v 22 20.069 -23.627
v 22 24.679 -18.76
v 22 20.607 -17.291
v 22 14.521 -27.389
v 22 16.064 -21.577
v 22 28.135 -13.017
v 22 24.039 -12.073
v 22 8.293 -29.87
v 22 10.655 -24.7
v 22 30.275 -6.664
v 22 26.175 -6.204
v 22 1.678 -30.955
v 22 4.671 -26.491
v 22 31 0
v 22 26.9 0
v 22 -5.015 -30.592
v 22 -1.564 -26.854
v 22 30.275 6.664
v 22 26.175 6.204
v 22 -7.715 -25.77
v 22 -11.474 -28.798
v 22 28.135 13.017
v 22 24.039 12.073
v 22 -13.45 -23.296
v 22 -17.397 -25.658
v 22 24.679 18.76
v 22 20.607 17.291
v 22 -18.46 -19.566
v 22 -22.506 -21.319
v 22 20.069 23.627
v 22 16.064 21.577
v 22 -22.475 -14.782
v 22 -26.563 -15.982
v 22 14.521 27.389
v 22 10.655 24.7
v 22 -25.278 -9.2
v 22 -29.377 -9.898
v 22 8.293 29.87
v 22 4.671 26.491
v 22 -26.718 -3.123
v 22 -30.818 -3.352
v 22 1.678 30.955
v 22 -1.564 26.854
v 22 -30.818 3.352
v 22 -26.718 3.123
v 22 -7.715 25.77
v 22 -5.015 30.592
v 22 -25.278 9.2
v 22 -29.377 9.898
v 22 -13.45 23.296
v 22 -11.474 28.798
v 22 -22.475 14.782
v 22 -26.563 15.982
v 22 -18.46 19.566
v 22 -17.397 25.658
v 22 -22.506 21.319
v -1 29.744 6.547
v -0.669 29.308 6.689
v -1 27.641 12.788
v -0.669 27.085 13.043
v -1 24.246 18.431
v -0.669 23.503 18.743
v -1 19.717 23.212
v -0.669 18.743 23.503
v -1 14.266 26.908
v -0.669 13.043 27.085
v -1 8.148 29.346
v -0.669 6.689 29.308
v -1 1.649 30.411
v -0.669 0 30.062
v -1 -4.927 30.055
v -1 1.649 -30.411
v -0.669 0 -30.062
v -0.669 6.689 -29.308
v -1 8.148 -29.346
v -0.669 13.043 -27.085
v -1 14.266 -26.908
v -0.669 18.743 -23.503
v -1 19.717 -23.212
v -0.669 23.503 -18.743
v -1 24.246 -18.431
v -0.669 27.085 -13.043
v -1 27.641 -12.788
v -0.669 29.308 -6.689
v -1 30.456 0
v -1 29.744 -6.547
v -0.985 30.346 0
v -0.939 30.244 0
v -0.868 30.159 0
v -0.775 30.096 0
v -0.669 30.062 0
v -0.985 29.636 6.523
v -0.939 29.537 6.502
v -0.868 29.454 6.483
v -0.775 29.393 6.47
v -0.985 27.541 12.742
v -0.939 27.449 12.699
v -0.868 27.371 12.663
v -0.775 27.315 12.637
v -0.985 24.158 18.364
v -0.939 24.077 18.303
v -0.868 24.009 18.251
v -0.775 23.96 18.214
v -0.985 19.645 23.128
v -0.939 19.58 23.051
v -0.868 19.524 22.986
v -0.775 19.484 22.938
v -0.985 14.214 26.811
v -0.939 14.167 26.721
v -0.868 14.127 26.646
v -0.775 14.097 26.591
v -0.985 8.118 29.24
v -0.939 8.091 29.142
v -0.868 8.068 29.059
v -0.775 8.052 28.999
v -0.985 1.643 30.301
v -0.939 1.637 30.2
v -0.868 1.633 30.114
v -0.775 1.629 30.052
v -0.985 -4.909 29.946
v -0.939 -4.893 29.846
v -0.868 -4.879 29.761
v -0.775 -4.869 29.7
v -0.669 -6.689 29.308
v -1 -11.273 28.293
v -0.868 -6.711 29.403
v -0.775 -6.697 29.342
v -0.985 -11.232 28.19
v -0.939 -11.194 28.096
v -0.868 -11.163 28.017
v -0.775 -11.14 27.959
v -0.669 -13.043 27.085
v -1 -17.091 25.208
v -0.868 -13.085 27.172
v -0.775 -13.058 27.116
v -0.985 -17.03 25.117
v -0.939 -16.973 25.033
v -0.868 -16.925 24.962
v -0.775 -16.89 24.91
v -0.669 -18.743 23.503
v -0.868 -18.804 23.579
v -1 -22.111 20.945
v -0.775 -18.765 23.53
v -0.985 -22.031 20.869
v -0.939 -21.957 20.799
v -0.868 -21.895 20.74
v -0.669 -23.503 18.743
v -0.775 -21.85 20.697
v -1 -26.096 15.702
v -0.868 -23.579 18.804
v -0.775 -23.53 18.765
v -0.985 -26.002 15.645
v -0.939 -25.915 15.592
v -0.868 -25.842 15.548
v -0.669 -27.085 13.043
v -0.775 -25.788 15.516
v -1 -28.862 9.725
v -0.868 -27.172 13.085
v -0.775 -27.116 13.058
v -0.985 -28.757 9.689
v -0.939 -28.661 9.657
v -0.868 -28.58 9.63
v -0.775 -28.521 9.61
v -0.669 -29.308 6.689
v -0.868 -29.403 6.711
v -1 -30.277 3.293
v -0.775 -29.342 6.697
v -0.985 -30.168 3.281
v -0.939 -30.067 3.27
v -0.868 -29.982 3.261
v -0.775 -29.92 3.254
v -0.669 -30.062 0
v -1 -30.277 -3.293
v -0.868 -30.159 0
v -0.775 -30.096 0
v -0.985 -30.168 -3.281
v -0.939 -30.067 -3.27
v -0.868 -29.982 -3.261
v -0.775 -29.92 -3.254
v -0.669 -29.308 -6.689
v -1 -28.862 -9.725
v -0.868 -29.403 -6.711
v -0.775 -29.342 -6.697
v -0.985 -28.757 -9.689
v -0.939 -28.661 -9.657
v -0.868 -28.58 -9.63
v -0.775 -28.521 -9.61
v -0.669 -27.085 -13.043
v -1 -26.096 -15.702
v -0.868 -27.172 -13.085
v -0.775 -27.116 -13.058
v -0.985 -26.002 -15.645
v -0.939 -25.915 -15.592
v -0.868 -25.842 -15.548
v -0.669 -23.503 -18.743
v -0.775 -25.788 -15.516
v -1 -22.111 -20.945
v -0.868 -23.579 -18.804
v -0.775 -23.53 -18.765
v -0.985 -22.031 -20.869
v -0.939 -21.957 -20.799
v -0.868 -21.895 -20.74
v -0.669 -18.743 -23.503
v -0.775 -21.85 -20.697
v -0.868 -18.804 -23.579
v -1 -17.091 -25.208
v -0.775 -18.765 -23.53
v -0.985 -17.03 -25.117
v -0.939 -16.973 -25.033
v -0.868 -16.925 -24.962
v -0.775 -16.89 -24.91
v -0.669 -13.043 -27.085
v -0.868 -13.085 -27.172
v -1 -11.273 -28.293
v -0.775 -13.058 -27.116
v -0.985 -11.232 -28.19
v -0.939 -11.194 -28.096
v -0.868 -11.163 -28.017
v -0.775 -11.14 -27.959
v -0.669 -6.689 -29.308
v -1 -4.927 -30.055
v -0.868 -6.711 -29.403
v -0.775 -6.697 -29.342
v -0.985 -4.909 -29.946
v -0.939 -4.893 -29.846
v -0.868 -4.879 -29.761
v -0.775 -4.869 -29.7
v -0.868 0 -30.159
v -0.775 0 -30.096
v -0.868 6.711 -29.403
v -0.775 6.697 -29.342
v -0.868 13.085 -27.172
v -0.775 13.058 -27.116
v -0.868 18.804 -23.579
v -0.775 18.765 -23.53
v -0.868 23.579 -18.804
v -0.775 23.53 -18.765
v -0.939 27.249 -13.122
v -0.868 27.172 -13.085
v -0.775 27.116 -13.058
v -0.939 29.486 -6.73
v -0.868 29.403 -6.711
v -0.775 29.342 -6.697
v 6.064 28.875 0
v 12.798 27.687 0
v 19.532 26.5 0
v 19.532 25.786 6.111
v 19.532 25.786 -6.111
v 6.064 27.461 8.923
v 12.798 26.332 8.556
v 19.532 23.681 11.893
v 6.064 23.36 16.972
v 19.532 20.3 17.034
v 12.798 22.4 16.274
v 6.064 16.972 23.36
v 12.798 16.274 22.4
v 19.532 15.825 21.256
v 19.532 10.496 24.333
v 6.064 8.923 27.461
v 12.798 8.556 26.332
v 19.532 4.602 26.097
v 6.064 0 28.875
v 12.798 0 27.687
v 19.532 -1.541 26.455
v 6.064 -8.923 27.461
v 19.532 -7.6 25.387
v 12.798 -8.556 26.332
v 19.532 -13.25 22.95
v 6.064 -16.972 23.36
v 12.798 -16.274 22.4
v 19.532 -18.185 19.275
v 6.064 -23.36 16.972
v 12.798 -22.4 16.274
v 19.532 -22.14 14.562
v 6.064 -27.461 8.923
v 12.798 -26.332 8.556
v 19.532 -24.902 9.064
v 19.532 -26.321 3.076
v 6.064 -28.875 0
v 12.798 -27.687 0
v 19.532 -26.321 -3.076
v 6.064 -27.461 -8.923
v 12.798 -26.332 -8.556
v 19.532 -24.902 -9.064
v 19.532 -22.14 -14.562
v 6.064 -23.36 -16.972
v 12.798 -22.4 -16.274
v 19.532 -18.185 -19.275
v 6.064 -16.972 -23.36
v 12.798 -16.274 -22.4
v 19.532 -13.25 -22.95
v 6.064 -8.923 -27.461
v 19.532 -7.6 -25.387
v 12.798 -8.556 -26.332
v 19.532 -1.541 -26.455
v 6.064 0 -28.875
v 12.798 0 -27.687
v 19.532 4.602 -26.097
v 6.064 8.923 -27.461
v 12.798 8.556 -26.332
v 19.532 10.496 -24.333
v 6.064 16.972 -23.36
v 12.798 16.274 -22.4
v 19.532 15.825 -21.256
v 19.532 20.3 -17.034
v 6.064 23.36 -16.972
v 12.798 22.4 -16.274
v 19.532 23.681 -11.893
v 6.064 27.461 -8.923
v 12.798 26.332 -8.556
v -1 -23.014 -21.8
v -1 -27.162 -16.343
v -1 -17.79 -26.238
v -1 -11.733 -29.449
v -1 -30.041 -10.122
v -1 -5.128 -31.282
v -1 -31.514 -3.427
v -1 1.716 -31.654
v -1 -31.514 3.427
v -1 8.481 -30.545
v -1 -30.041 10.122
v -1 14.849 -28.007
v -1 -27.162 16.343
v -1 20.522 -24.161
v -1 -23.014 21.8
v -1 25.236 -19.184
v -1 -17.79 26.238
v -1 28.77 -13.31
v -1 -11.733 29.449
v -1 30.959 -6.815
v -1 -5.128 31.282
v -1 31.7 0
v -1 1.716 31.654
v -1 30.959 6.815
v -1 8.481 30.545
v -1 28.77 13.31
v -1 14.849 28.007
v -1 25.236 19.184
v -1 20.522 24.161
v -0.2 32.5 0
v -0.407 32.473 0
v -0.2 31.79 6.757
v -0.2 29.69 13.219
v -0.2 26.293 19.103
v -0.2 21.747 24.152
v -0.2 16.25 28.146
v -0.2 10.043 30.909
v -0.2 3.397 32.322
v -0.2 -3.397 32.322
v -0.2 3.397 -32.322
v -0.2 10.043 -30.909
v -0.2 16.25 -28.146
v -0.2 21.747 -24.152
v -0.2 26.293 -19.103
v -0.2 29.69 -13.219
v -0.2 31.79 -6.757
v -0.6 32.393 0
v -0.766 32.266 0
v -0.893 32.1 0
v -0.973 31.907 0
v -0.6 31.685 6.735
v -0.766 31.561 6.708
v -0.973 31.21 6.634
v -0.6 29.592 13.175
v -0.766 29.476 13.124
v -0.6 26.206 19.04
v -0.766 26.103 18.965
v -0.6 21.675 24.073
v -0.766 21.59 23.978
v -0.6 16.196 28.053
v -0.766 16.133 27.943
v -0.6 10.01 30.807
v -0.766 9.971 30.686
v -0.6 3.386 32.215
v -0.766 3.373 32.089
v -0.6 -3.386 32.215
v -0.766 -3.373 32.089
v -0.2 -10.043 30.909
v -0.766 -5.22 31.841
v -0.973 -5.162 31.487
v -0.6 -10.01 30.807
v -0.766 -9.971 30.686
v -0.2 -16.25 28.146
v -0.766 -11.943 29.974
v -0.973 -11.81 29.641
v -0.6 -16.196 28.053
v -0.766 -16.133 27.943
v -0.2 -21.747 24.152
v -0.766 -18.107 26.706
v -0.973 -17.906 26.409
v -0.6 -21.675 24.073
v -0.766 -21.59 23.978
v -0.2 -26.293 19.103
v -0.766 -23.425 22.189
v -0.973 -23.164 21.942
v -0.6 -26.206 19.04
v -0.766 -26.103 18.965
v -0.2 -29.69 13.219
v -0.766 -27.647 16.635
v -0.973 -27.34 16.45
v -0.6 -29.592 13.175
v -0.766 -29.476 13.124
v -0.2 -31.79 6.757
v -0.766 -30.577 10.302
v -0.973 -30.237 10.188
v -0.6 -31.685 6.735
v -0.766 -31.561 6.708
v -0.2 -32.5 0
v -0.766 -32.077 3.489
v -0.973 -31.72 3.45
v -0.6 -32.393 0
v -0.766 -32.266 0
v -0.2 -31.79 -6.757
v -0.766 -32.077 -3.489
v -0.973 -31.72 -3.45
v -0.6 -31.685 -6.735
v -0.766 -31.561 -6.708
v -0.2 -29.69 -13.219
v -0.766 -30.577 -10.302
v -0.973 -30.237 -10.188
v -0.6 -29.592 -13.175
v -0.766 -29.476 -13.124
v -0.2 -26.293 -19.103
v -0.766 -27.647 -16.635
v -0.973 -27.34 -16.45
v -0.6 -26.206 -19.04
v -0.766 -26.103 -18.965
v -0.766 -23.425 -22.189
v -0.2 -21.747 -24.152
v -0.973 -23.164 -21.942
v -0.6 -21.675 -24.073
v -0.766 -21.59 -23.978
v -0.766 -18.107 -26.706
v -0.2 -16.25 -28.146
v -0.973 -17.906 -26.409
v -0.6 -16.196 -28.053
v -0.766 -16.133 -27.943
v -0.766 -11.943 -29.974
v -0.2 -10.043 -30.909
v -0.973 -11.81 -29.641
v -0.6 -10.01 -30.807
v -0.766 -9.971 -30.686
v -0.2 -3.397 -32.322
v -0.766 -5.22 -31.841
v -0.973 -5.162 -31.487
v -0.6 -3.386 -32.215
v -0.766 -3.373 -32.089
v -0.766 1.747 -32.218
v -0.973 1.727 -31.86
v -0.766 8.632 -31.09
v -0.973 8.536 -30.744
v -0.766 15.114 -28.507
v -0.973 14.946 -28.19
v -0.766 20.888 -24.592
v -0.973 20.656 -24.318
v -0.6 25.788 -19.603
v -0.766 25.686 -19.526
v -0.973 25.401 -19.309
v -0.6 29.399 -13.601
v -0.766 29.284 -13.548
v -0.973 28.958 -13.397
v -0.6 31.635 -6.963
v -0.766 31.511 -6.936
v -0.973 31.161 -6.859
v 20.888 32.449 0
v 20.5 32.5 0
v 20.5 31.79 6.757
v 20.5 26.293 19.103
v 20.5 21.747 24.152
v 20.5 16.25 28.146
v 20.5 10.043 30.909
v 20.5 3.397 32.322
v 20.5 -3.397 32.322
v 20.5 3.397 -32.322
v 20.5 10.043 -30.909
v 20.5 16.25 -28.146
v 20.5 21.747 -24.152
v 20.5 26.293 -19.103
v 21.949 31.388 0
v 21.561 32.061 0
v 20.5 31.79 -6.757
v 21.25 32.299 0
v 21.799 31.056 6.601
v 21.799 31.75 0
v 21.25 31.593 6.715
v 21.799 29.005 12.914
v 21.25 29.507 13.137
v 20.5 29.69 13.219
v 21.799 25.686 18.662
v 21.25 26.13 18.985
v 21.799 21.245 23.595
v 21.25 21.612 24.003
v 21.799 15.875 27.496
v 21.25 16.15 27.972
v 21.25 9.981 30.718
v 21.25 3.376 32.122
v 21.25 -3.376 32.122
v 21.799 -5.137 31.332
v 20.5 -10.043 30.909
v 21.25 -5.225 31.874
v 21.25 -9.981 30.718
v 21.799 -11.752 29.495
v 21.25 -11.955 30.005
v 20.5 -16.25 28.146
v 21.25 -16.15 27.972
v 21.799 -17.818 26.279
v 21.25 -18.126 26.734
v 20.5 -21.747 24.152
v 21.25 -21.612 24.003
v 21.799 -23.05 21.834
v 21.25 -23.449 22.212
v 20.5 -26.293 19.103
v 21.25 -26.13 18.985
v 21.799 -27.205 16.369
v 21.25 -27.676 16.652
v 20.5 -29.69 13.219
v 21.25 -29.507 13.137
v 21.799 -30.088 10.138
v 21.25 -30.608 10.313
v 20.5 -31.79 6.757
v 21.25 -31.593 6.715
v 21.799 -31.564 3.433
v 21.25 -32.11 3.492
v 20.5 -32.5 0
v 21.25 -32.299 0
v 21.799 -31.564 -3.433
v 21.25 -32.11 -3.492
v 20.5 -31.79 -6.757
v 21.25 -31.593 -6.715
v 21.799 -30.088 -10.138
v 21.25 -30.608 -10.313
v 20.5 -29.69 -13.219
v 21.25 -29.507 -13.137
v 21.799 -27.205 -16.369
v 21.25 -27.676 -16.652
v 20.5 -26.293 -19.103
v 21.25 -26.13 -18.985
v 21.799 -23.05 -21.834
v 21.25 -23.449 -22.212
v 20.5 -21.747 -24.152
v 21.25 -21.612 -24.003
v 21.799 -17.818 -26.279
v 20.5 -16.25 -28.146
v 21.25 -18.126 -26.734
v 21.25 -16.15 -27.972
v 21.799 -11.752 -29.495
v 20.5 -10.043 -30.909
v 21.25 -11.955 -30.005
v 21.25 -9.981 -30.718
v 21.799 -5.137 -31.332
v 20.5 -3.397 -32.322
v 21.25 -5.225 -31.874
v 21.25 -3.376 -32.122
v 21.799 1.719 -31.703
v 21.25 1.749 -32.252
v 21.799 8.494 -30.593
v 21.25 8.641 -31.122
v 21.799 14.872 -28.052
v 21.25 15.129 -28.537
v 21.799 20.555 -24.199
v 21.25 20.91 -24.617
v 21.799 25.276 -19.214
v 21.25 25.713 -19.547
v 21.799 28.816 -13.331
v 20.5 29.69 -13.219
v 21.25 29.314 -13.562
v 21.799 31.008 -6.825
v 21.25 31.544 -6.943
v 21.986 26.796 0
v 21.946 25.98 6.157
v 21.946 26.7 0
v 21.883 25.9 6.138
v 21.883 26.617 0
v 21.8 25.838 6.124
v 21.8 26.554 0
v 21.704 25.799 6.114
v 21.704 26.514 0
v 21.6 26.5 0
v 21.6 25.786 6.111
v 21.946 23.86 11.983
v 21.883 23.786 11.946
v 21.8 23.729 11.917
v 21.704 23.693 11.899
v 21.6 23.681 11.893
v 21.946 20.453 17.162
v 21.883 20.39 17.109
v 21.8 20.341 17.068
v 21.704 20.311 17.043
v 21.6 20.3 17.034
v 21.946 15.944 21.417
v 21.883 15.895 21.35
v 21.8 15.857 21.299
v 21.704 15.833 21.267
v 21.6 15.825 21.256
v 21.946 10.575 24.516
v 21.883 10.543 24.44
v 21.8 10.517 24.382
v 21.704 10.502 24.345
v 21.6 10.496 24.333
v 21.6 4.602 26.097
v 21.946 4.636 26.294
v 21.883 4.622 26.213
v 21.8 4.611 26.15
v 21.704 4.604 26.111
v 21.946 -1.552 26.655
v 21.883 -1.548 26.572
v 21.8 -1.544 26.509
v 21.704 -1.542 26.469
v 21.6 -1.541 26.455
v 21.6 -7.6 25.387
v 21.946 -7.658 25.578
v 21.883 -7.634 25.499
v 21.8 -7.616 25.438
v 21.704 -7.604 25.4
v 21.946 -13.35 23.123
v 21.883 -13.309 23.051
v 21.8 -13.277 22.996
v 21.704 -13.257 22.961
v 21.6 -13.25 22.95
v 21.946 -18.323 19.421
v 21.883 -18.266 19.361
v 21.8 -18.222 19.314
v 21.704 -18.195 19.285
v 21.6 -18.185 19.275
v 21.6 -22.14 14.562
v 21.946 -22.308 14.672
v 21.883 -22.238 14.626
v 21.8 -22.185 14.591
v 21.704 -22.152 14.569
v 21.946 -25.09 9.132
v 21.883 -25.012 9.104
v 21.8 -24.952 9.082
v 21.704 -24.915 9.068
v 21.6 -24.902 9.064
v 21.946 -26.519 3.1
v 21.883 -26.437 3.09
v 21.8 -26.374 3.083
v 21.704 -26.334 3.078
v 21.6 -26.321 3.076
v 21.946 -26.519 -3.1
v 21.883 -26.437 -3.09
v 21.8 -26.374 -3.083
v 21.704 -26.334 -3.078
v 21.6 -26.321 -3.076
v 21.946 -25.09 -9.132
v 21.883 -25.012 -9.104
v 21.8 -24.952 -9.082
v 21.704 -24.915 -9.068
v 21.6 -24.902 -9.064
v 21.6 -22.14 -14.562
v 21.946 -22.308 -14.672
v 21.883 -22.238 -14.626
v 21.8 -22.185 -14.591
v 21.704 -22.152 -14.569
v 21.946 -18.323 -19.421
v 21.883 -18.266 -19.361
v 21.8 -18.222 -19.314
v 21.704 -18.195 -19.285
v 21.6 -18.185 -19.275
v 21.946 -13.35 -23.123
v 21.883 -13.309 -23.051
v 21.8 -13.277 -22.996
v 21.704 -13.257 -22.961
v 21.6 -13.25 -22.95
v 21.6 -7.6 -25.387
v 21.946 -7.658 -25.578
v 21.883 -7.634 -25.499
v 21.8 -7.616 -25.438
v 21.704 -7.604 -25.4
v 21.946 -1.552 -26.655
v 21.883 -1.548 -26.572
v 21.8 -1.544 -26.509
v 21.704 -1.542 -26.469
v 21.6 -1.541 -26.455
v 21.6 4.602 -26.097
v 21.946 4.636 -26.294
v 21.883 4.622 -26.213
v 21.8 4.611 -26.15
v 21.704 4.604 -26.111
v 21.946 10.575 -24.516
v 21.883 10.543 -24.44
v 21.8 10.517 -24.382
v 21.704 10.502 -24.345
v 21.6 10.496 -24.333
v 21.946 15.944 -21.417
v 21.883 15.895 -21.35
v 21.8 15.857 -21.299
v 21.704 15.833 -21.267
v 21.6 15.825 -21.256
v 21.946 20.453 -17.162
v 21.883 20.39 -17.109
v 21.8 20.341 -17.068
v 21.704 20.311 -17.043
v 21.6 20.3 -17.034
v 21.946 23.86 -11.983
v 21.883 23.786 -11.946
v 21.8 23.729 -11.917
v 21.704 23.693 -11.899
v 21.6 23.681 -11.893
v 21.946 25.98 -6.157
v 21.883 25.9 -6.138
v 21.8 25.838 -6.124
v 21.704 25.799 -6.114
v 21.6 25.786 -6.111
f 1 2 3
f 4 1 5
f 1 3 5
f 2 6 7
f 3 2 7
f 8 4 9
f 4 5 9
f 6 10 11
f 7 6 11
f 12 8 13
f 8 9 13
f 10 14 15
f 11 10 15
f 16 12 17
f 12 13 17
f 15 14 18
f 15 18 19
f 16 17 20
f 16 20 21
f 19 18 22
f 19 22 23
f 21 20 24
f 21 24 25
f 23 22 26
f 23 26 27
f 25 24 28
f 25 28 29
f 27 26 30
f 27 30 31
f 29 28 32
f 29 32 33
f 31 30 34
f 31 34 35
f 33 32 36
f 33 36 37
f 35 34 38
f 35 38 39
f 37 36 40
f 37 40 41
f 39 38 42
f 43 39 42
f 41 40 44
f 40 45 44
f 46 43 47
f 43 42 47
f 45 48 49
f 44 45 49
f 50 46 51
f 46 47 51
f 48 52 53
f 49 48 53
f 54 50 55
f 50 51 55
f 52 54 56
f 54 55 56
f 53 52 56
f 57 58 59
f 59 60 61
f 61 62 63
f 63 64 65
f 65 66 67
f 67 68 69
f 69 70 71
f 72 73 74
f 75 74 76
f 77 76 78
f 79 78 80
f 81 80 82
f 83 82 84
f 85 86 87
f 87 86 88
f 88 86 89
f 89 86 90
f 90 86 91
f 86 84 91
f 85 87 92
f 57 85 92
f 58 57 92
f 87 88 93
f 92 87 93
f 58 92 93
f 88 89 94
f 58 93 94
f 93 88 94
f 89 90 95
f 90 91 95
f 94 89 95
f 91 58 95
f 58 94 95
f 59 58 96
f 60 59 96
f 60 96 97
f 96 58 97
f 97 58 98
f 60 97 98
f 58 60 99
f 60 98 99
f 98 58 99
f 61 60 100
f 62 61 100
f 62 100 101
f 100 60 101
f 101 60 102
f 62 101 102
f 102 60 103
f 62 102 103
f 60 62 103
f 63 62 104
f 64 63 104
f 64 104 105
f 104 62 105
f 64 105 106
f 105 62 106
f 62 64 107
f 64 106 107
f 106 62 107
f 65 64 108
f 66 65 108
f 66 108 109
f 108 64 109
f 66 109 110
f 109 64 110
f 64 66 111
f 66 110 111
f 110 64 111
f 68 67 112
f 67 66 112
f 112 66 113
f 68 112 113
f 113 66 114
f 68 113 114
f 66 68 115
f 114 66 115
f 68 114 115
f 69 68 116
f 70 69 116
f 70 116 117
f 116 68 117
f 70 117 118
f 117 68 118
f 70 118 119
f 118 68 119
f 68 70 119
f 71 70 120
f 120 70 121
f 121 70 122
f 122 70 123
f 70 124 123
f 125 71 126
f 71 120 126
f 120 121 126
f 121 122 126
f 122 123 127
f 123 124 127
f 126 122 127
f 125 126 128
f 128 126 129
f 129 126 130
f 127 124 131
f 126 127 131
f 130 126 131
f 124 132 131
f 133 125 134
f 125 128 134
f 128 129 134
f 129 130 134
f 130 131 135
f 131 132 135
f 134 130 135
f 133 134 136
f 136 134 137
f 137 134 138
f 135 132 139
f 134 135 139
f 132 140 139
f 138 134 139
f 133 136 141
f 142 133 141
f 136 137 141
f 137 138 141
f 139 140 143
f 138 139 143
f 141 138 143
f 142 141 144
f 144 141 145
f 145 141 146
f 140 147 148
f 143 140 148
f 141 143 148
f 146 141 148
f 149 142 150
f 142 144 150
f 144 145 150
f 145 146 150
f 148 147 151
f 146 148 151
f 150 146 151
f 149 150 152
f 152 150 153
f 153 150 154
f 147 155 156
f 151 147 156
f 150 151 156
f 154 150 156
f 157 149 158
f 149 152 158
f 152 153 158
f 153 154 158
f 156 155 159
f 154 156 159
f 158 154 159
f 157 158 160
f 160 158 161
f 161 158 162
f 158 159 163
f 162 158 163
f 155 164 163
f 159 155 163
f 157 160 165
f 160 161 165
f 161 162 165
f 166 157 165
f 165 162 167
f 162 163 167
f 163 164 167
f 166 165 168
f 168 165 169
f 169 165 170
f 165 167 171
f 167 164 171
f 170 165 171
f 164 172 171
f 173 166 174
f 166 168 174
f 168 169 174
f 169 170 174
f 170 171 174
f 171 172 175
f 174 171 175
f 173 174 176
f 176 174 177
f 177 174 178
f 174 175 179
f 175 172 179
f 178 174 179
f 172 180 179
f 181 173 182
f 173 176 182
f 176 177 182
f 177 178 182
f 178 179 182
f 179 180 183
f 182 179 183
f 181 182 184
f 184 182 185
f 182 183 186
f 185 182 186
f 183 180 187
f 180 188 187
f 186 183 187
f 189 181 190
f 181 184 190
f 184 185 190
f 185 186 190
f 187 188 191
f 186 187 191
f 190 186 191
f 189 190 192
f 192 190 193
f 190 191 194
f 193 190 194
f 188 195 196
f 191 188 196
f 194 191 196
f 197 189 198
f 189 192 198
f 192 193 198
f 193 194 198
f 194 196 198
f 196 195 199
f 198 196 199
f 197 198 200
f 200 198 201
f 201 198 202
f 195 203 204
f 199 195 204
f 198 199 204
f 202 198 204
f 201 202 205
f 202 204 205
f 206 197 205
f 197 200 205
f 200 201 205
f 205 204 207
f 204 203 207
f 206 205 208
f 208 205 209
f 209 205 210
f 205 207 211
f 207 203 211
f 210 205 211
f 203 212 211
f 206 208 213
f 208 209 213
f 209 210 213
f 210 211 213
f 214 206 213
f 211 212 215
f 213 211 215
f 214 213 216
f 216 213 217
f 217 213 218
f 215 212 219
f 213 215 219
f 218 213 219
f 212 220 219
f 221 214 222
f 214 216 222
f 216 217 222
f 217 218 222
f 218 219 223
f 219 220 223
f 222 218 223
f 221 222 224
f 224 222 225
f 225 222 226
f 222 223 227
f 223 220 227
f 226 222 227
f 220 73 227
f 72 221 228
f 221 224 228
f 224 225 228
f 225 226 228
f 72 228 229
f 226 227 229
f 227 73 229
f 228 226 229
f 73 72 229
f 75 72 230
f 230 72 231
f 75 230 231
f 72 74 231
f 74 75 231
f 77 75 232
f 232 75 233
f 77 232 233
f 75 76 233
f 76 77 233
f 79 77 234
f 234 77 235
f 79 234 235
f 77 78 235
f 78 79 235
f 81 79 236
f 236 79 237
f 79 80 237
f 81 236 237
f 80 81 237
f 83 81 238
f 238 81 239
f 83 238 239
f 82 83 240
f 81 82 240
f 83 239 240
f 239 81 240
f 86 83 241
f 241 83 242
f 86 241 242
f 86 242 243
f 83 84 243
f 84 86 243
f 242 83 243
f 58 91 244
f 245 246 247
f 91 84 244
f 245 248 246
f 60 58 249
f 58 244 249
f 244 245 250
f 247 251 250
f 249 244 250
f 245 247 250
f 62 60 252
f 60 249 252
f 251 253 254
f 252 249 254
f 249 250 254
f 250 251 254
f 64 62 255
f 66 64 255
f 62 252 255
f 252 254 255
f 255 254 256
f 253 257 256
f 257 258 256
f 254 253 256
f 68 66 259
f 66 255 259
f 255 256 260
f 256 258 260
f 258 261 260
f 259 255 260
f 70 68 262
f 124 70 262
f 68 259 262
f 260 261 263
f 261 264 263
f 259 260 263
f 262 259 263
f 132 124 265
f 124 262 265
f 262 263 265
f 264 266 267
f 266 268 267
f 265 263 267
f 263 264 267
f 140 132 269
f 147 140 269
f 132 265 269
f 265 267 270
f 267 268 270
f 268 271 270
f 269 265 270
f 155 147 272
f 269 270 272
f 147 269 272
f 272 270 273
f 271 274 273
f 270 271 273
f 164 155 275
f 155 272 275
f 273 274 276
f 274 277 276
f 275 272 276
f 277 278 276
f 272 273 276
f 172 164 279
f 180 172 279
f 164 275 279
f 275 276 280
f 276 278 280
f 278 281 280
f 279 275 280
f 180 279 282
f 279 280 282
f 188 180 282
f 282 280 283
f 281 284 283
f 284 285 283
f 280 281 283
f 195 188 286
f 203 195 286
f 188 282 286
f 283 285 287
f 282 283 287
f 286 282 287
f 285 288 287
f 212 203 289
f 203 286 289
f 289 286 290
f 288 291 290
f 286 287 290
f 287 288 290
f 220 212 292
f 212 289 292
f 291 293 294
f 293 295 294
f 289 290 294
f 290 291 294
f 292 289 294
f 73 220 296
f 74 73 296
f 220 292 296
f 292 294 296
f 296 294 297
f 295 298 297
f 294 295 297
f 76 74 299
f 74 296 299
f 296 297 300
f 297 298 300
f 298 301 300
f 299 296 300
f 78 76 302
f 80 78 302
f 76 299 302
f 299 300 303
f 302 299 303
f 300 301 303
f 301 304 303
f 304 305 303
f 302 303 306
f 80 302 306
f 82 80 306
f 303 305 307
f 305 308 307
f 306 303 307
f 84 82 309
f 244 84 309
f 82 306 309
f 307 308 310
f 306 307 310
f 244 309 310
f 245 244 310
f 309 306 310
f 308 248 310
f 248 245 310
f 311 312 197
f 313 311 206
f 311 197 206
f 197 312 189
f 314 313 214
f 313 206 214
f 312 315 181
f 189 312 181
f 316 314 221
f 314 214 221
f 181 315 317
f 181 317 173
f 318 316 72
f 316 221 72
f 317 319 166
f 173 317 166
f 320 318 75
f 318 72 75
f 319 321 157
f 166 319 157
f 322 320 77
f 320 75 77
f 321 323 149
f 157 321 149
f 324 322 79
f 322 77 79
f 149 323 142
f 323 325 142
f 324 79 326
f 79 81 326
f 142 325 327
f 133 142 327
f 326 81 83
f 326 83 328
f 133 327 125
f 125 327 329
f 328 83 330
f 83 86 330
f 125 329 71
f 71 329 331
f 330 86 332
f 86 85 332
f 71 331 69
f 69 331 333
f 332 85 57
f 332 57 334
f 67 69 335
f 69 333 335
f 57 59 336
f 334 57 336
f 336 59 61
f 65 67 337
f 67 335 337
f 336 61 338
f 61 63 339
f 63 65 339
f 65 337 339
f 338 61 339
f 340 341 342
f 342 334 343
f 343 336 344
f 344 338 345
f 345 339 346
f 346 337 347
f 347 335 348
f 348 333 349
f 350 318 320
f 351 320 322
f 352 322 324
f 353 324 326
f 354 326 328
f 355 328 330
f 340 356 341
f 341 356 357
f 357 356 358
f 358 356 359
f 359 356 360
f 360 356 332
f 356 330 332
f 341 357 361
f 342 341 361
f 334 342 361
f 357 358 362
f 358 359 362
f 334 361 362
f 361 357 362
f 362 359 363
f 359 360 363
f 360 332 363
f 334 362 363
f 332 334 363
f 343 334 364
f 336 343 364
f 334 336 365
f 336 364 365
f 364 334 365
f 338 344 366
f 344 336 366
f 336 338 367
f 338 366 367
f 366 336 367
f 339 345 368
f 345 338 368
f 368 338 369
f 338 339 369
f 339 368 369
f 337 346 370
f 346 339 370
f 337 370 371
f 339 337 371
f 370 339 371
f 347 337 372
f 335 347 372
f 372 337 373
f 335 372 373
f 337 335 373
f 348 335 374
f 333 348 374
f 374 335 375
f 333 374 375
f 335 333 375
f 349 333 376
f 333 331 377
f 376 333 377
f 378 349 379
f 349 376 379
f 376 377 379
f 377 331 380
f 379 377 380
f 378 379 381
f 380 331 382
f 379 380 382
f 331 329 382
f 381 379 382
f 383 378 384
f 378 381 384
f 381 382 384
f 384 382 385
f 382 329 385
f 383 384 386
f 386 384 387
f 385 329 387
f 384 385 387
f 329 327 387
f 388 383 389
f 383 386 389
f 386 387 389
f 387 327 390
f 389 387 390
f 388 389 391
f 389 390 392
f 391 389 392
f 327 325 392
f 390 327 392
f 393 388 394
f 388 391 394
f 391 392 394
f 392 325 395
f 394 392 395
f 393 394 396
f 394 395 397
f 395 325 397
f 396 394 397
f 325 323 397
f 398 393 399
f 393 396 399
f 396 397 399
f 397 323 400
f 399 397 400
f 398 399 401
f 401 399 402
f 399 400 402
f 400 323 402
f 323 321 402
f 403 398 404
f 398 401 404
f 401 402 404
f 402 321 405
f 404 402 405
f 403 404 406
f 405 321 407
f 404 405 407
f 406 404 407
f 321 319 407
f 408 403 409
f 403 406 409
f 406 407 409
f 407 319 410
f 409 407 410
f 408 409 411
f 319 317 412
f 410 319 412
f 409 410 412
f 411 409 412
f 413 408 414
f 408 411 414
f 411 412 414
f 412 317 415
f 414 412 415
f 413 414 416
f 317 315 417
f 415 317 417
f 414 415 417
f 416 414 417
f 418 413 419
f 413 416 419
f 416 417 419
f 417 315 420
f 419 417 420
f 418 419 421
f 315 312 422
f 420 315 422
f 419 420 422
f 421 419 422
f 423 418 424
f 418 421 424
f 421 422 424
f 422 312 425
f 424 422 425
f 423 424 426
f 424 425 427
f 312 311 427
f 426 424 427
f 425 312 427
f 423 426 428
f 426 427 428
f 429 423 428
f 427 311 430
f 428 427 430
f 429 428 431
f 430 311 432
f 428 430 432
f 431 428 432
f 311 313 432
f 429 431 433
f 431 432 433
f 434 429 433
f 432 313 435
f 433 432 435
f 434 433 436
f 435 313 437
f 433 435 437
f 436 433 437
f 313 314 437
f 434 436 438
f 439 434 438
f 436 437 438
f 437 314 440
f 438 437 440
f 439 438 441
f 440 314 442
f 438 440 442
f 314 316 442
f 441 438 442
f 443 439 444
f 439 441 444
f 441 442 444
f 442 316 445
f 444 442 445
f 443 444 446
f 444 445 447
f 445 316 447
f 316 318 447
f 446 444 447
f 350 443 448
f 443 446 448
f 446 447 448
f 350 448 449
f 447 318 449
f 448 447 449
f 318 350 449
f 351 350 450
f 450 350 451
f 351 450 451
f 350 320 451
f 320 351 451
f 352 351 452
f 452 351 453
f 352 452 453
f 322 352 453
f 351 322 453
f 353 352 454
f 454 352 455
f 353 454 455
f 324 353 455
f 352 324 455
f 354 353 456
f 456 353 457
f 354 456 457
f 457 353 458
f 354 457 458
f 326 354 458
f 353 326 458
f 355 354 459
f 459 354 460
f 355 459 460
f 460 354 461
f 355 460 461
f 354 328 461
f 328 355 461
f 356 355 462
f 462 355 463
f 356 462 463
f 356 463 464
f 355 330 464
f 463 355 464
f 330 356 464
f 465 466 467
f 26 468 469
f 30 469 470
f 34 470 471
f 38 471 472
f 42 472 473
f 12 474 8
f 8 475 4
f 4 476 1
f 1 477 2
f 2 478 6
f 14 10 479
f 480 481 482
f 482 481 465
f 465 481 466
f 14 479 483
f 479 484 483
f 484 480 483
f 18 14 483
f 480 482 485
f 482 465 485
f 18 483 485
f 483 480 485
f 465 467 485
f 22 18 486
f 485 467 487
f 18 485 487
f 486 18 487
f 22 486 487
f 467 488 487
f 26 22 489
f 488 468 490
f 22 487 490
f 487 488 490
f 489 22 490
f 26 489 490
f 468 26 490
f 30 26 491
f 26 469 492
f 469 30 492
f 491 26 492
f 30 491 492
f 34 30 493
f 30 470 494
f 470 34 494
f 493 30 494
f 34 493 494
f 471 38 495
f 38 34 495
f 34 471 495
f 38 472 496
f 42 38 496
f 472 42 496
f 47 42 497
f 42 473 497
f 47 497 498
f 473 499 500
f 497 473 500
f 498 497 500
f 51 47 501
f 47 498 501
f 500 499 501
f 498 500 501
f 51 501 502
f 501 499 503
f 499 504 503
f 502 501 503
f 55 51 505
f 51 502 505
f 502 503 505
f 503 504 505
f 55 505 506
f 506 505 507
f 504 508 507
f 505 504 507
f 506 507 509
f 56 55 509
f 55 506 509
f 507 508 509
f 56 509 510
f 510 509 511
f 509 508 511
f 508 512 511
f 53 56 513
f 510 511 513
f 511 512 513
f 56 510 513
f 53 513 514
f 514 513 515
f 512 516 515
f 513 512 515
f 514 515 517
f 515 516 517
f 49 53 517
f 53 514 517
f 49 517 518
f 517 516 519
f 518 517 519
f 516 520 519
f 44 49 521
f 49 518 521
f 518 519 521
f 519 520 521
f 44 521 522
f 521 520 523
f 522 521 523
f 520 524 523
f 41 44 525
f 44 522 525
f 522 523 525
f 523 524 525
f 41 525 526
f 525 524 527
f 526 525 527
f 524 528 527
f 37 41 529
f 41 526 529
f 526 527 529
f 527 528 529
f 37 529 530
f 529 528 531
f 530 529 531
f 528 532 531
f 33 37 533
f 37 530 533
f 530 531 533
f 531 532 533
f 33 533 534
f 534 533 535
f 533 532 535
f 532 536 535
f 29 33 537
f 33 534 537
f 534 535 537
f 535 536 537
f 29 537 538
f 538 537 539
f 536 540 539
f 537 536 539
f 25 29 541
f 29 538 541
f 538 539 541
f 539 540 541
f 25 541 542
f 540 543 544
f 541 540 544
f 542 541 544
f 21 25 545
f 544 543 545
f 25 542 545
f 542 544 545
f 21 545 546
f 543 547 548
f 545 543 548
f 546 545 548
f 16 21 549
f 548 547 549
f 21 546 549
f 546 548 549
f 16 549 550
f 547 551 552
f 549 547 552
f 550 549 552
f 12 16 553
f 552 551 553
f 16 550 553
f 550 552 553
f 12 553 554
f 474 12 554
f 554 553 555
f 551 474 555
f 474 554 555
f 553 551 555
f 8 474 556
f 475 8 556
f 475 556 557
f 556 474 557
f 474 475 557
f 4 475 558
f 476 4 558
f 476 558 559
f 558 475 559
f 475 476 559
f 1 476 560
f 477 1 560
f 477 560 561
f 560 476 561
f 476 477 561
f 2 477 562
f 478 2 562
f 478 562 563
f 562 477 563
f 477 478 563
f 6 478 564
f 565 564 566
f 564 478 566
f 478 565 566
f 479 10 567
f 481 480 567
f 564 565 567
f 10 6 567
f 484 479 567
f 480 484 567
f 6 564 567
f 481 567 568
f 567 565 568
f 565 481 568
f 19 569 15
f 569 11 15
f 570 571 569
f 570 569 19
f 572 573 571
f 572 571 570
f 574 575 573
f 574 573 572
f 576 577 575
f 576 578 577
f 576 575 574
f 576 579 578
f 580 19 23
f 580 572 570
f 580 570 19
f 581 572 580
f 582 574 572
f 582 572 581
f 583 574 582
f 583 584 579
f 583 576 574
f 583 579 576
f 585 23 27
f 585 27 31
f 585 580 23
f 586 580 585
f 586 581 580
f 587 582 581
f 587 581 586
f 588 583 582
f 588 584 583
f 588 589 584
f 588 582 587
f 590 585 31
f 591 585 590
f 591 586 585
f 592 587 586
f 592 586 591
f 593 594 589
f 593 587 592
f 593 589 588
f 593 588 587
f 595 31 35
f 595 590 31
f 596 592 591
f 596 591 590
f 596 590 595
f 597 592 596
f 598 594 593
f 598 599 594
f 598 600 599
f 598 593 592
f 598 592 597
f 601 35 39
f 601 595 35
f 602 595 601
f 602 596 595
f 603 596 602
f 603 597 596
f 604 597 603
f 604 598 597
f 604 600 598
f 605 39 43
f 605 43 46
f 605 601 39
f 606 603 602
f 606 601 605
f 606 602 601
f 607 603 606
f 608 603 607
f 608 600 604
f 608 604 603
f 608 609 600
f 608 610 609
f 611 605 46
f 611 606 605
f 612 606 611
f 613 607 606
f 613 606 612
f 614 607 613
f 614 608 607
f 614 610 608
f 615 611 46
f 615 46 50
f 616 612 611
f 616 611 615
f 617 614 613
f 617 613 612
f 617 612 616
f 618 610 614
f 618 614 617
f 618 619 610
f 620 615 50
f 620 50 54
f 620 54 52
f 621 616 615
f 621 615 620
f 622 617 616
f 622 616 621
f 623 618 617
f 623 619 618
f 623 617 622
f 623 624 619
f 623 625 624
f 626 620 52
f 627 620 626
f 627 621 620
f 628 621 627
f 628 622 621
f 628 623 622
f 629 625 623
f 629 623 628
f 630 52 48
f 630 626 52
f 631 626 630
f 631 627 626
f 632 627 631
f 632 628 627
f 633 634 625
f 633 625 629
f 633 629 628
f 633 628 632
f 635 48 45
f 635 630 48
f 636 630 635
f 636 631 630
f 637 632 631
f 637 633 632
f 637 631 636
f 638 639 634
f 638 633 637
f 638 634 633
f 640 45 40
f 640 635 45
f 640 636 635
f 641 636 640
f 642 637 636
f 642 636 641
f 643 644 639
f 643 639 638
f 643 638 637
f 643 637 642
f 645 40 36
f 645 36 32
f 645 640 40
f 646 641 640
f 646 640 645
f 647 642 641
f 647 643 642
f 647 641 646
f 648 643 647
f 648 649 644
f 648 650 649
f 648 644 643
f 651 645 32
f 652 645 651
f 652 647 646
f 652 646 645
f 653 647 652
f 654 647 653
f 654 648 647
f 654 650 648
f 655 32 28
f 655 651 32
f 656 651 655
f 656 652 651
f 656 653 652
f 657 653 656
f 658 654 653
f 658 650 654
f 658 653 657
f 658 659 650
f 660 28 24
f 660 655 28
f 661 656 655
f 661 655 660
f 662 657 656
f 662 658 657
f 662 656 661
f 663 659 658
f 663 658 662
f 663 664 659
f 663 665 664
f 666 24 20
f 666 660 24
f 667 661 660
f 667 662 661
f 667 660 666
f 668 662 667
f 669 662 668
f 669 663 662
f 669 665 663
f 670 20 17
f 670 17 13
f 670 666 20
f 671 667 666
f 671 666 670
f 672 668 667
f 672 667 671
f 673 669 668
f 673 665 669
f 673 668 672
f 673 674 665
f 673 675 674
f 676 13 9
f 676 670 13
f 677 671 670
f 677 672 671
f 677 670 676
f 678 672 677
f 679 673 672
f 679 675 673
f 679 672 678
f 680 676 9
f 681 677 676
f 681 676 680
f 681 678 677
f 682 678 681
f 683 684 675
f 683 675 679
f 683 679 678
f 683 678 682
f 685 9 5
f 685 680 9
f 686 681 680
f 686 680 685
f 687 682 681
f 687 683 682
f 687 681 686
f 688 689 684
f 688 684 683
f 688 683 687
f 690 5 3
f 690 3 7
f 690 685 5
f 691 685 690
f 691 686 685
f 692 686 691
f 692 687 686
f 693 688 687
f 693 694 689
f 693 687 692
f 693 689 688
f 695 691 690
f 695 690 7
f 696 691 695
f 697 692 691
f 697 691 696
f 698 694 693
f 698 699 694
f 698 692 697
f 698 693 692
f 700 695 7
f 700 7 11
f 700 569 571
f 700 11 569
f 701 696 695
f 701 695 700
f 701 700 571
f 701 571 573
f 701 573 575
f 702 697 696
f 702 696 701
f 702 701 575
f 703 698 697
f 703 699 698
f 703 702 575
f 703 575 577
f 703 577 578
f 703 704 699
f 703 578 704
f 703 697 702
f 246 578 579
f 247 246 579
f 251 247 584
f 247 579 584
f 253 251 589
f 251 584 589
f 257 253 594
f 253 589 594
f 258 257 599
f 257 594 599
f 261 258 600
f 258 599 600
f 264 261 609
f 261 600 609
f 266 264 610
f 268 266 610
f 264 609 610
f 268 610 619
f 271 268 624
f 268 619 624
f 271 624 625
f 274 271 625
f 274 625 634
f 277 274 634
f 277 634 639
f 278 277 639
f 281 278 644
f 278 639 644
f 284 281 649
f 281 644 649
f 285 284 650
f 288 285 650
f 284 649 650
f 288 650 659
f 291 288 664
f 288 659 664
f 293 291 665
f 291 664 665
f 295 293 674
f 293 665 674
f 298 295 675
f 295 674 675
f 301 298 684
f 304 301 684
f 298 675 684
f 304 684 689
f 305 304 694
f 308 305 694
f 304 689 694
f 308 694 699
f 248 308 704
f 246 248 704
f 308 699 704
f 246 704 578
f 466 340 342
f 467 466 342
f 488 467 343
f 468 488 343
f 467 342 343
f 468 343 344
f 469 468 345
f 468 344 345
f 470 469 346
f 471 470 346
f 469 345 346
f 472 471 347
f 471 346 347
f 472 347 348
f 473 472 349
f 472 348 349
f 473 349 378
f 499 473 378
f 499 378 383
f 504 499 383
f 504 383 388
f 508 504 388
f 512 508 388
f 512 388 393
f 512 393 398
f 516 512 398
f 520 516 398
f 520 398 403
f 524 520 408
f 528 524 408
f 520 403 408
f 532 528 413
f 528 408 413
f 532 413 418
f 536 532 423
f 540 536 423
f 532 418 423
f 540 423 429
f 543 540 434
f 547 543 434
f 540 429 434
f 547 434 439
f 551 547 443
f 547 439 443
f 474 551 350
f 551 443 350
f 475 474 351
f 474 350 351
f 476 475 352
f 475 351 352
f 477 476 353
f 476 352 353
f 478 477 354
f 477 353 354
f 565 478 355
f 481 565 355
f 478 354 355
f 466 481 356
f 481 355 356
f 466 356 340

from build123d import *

# Parameters (mm, degrees)
FILLET1_R = 1.5
FILLET2_R = 0.8
FILLET3_R = 0.4


with BuildPart() as part:
    # Sketch1 → Revolve1 (revolve)
    with BuildSketch(Plane.XY):
        Polygon((22, 26.5), (22, 32.5), (-1, 32.5), (-1, 30.120326542), (19.5318921, 26.5), align=None)
    revolve(axis=Axis((0, 0, 0), (1, 0, 0)))

    # Fillet1
    fillet1_edges = [part.edges().sort_by_distance(p)[0] for p in [
        (22, -32.5, 0),
    ]]
    fillet(fillet1_edges, radius=FILLET1_R)

    # Fillet2
    fillet2_edges = [part.edges().sort_by_distance(p)[0] for p in [
        (-1, -32.5, 0),
    ]]
    fillet(fillet2_edges, radius=FILLET2_R)

    # Fillet3
    fillet3_edges = [part.edges().sort_by_distance(p)[0] for p in [
        (22, -26.5, 0),
        (-1, -30.120326542, 0),
    ]]
    fillet(fillet3_edges, radius=FILLET3_R)


solid = part.part
